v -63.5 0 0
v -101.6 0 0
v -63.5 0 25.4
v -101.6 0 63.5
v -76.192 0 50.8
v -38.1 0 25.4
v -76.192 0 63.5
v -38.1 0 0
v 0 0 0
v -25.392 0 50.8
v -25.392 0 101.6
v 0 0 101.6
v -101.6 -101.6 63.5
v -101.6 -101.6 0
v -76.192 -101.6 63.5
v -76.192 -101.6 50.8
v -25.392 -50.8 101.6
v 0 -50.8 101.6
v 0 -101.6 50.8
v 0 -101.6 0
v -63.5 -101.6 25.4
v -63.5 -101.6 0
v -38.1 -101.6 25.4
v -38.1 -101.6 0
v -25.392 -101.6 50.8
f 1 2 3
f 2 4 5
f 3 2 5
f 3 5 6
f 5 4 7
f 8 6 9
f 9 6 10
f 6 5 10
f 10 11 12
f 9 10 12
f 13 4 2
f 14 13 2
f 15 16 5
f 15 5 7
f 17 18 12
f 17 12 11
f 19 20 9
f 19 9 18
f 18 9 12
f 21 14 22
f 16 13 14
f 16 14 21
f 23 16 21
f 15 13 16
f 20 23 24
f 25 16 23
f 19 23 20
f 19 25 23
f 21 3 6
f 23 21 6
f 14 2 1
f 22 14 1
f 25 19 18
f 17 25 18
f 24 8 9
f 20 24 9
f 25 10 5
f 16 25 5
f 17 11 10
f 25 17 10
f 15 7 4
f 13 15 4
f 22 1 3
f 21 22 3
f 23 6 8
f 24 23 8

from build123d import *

# Parameters (mm, degrees)
F1_DEPTH = 101.6
F3_DEPTH = 25.4


with BuildPart() as f1:
    # F0 (on Front) → F1 (new body)
    with BuildSketch(Plane.XZ):
        Polygon((-38.1, 0), (0, 0), (0, 101.6), (-25.391597, 101.6), (-25.391597, 50.8), (-76.191597, 50.8), (-76.191597, 63.5), (-101.6, 63.5), (-101.6, 0), (-63.5, 0), (-63.5, 25.4), (-38.1, 25.4), align=None)
    extrude(amount=F1_DEPTH)

    # F2 (on face) → F3 (cut)
    with BuildSketch(Plane.YZ):
        Polygon((-101.6, 101.6), (-101.6, 50.8), (-50.8, 101.6), align=None)
    extrude(amount=-F3_DEPTH, mode=Mode.SUBTRACT)


solid = f1.part
